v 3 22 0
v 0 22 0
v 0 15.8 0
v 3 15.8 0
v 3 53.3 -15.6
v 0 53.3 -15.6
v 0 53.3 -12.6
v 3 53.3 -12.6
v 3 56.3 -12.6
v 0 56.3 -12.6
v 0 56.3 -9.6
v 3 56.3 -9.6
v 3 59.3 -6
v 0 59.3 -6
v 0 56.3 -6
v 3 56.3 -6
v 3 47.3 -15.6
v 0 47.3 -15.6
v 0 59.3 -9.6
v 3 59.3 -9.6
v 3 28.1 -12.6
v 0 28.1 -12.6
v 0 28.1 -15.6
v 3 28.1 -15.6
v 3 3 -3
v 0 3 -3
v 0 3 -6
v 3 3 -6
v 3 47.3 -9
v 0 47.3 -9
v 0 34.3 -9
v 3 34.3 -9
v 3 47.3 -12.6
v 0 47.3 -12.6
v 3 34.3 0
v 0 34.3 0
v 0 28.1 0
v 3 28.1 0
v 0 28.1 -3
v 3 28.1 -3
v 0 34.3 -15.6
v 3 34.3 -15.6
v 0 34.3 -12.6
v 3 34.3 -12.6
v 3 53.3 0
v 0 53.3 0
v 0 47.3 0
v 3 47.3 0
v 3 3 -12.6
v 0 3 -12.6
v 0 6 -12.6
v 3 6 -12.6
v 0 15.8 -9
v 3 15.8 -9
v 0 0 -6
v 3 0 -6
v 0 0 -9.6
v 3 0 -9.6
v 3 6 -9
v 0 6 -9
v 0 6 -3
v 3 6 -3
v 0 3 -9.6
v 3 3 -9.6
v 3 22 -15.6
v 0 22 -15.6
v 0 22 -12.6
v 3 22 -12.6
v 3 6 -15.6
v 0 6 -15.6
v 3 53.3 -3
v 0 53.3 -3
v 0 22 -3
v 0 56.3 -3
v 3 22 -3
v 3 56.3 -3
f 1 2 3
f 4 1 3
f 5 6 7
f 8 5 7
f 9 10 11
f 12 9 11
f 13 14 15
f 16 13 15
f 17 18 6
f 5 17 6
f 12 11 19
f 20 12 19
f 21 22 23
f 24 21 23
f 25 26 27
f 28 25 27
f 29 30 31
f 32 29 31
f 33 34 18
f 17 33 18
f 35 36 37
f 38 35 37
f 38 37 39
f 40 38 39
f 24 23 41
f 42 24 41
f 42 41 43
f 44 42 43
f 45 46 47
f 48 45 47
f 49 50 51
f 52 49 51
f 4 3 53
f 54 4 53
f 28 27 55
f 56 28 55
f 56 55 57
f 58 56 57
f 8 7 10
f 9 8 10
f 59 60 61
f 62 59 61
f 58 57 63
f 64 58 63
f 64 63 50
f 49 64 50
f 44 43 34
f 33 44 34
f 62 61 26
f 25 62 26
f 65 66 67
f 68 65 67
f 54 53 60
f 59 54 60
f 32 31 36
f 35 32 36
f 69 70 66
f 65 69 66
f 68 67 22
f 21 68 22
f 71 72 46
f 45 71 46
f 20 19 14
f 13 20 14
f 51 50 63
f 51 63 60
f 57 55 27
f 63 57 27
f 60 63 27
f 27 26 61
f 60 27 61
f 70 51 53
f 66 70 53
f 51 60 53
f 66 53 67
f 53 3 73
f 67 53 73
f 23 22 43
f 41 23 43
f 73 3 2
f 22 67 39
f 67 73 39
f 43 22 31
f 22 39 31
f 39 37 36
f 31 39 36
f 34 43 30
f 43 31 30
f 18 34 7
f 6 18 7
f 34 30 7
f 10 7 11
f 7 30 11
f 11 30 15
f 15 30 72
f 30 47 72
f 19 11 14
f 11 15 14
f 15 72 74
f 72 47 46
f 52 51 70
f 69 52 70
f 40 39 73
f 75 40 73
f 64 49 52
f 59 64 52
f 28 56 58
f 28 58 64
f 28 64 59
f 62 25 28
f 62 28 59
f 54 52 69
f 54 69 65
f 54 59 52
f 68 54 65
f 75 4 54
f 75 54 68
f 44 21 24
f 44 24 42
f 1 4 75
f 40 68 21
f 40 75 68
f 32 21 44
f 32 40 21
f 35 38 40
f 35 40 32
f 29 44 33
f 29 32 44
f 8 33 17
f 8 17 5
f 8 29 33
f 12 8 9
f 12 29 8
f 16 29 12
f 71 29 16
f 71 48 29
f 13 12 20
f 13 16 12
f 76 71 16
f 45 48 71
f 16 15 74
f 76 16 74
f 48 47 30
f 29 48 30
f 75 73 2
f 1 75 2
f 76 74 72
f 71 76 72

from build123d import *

# Parameters (mm, degrees)
F1_DEPTH = 3


with BuildPart() as f1:
    # F0 (on Right) → F1 (new body)
    with BuildSketch(Plane.YZ):
        Polygon((3, -6), (0, -6), (0, -9.6), (3, -9.6), (3, -12.6), (6, -12.6), (6, -15.6), (22, -15.6), (22, -12.6), (28.1, -12.6), (28.1, -15.6), (34.3, -15.6), (34.3, -12.6), (47.3, -12.6), (47.3, -15.6), (53.3, -15.6), (53.3, -12.6), (56.3, -12.6), (56.3, -9.6), (59.3, -9.6), (59.3, -6), (56.3, -6), (56.3, -3), (53.3, -3), (53.3, 0), (47.3, 0), (47.3, -9), (34.3, -9), (34.3, 0), (28.1, 0), (28.1, -3), (22, -3), (22, 0), (15.8, 0), (15.8, -9), (6, -9), (6, -3), (3, -3), align=None)
    extrude(amount=F1_DEPTH)


solid = f1.part
